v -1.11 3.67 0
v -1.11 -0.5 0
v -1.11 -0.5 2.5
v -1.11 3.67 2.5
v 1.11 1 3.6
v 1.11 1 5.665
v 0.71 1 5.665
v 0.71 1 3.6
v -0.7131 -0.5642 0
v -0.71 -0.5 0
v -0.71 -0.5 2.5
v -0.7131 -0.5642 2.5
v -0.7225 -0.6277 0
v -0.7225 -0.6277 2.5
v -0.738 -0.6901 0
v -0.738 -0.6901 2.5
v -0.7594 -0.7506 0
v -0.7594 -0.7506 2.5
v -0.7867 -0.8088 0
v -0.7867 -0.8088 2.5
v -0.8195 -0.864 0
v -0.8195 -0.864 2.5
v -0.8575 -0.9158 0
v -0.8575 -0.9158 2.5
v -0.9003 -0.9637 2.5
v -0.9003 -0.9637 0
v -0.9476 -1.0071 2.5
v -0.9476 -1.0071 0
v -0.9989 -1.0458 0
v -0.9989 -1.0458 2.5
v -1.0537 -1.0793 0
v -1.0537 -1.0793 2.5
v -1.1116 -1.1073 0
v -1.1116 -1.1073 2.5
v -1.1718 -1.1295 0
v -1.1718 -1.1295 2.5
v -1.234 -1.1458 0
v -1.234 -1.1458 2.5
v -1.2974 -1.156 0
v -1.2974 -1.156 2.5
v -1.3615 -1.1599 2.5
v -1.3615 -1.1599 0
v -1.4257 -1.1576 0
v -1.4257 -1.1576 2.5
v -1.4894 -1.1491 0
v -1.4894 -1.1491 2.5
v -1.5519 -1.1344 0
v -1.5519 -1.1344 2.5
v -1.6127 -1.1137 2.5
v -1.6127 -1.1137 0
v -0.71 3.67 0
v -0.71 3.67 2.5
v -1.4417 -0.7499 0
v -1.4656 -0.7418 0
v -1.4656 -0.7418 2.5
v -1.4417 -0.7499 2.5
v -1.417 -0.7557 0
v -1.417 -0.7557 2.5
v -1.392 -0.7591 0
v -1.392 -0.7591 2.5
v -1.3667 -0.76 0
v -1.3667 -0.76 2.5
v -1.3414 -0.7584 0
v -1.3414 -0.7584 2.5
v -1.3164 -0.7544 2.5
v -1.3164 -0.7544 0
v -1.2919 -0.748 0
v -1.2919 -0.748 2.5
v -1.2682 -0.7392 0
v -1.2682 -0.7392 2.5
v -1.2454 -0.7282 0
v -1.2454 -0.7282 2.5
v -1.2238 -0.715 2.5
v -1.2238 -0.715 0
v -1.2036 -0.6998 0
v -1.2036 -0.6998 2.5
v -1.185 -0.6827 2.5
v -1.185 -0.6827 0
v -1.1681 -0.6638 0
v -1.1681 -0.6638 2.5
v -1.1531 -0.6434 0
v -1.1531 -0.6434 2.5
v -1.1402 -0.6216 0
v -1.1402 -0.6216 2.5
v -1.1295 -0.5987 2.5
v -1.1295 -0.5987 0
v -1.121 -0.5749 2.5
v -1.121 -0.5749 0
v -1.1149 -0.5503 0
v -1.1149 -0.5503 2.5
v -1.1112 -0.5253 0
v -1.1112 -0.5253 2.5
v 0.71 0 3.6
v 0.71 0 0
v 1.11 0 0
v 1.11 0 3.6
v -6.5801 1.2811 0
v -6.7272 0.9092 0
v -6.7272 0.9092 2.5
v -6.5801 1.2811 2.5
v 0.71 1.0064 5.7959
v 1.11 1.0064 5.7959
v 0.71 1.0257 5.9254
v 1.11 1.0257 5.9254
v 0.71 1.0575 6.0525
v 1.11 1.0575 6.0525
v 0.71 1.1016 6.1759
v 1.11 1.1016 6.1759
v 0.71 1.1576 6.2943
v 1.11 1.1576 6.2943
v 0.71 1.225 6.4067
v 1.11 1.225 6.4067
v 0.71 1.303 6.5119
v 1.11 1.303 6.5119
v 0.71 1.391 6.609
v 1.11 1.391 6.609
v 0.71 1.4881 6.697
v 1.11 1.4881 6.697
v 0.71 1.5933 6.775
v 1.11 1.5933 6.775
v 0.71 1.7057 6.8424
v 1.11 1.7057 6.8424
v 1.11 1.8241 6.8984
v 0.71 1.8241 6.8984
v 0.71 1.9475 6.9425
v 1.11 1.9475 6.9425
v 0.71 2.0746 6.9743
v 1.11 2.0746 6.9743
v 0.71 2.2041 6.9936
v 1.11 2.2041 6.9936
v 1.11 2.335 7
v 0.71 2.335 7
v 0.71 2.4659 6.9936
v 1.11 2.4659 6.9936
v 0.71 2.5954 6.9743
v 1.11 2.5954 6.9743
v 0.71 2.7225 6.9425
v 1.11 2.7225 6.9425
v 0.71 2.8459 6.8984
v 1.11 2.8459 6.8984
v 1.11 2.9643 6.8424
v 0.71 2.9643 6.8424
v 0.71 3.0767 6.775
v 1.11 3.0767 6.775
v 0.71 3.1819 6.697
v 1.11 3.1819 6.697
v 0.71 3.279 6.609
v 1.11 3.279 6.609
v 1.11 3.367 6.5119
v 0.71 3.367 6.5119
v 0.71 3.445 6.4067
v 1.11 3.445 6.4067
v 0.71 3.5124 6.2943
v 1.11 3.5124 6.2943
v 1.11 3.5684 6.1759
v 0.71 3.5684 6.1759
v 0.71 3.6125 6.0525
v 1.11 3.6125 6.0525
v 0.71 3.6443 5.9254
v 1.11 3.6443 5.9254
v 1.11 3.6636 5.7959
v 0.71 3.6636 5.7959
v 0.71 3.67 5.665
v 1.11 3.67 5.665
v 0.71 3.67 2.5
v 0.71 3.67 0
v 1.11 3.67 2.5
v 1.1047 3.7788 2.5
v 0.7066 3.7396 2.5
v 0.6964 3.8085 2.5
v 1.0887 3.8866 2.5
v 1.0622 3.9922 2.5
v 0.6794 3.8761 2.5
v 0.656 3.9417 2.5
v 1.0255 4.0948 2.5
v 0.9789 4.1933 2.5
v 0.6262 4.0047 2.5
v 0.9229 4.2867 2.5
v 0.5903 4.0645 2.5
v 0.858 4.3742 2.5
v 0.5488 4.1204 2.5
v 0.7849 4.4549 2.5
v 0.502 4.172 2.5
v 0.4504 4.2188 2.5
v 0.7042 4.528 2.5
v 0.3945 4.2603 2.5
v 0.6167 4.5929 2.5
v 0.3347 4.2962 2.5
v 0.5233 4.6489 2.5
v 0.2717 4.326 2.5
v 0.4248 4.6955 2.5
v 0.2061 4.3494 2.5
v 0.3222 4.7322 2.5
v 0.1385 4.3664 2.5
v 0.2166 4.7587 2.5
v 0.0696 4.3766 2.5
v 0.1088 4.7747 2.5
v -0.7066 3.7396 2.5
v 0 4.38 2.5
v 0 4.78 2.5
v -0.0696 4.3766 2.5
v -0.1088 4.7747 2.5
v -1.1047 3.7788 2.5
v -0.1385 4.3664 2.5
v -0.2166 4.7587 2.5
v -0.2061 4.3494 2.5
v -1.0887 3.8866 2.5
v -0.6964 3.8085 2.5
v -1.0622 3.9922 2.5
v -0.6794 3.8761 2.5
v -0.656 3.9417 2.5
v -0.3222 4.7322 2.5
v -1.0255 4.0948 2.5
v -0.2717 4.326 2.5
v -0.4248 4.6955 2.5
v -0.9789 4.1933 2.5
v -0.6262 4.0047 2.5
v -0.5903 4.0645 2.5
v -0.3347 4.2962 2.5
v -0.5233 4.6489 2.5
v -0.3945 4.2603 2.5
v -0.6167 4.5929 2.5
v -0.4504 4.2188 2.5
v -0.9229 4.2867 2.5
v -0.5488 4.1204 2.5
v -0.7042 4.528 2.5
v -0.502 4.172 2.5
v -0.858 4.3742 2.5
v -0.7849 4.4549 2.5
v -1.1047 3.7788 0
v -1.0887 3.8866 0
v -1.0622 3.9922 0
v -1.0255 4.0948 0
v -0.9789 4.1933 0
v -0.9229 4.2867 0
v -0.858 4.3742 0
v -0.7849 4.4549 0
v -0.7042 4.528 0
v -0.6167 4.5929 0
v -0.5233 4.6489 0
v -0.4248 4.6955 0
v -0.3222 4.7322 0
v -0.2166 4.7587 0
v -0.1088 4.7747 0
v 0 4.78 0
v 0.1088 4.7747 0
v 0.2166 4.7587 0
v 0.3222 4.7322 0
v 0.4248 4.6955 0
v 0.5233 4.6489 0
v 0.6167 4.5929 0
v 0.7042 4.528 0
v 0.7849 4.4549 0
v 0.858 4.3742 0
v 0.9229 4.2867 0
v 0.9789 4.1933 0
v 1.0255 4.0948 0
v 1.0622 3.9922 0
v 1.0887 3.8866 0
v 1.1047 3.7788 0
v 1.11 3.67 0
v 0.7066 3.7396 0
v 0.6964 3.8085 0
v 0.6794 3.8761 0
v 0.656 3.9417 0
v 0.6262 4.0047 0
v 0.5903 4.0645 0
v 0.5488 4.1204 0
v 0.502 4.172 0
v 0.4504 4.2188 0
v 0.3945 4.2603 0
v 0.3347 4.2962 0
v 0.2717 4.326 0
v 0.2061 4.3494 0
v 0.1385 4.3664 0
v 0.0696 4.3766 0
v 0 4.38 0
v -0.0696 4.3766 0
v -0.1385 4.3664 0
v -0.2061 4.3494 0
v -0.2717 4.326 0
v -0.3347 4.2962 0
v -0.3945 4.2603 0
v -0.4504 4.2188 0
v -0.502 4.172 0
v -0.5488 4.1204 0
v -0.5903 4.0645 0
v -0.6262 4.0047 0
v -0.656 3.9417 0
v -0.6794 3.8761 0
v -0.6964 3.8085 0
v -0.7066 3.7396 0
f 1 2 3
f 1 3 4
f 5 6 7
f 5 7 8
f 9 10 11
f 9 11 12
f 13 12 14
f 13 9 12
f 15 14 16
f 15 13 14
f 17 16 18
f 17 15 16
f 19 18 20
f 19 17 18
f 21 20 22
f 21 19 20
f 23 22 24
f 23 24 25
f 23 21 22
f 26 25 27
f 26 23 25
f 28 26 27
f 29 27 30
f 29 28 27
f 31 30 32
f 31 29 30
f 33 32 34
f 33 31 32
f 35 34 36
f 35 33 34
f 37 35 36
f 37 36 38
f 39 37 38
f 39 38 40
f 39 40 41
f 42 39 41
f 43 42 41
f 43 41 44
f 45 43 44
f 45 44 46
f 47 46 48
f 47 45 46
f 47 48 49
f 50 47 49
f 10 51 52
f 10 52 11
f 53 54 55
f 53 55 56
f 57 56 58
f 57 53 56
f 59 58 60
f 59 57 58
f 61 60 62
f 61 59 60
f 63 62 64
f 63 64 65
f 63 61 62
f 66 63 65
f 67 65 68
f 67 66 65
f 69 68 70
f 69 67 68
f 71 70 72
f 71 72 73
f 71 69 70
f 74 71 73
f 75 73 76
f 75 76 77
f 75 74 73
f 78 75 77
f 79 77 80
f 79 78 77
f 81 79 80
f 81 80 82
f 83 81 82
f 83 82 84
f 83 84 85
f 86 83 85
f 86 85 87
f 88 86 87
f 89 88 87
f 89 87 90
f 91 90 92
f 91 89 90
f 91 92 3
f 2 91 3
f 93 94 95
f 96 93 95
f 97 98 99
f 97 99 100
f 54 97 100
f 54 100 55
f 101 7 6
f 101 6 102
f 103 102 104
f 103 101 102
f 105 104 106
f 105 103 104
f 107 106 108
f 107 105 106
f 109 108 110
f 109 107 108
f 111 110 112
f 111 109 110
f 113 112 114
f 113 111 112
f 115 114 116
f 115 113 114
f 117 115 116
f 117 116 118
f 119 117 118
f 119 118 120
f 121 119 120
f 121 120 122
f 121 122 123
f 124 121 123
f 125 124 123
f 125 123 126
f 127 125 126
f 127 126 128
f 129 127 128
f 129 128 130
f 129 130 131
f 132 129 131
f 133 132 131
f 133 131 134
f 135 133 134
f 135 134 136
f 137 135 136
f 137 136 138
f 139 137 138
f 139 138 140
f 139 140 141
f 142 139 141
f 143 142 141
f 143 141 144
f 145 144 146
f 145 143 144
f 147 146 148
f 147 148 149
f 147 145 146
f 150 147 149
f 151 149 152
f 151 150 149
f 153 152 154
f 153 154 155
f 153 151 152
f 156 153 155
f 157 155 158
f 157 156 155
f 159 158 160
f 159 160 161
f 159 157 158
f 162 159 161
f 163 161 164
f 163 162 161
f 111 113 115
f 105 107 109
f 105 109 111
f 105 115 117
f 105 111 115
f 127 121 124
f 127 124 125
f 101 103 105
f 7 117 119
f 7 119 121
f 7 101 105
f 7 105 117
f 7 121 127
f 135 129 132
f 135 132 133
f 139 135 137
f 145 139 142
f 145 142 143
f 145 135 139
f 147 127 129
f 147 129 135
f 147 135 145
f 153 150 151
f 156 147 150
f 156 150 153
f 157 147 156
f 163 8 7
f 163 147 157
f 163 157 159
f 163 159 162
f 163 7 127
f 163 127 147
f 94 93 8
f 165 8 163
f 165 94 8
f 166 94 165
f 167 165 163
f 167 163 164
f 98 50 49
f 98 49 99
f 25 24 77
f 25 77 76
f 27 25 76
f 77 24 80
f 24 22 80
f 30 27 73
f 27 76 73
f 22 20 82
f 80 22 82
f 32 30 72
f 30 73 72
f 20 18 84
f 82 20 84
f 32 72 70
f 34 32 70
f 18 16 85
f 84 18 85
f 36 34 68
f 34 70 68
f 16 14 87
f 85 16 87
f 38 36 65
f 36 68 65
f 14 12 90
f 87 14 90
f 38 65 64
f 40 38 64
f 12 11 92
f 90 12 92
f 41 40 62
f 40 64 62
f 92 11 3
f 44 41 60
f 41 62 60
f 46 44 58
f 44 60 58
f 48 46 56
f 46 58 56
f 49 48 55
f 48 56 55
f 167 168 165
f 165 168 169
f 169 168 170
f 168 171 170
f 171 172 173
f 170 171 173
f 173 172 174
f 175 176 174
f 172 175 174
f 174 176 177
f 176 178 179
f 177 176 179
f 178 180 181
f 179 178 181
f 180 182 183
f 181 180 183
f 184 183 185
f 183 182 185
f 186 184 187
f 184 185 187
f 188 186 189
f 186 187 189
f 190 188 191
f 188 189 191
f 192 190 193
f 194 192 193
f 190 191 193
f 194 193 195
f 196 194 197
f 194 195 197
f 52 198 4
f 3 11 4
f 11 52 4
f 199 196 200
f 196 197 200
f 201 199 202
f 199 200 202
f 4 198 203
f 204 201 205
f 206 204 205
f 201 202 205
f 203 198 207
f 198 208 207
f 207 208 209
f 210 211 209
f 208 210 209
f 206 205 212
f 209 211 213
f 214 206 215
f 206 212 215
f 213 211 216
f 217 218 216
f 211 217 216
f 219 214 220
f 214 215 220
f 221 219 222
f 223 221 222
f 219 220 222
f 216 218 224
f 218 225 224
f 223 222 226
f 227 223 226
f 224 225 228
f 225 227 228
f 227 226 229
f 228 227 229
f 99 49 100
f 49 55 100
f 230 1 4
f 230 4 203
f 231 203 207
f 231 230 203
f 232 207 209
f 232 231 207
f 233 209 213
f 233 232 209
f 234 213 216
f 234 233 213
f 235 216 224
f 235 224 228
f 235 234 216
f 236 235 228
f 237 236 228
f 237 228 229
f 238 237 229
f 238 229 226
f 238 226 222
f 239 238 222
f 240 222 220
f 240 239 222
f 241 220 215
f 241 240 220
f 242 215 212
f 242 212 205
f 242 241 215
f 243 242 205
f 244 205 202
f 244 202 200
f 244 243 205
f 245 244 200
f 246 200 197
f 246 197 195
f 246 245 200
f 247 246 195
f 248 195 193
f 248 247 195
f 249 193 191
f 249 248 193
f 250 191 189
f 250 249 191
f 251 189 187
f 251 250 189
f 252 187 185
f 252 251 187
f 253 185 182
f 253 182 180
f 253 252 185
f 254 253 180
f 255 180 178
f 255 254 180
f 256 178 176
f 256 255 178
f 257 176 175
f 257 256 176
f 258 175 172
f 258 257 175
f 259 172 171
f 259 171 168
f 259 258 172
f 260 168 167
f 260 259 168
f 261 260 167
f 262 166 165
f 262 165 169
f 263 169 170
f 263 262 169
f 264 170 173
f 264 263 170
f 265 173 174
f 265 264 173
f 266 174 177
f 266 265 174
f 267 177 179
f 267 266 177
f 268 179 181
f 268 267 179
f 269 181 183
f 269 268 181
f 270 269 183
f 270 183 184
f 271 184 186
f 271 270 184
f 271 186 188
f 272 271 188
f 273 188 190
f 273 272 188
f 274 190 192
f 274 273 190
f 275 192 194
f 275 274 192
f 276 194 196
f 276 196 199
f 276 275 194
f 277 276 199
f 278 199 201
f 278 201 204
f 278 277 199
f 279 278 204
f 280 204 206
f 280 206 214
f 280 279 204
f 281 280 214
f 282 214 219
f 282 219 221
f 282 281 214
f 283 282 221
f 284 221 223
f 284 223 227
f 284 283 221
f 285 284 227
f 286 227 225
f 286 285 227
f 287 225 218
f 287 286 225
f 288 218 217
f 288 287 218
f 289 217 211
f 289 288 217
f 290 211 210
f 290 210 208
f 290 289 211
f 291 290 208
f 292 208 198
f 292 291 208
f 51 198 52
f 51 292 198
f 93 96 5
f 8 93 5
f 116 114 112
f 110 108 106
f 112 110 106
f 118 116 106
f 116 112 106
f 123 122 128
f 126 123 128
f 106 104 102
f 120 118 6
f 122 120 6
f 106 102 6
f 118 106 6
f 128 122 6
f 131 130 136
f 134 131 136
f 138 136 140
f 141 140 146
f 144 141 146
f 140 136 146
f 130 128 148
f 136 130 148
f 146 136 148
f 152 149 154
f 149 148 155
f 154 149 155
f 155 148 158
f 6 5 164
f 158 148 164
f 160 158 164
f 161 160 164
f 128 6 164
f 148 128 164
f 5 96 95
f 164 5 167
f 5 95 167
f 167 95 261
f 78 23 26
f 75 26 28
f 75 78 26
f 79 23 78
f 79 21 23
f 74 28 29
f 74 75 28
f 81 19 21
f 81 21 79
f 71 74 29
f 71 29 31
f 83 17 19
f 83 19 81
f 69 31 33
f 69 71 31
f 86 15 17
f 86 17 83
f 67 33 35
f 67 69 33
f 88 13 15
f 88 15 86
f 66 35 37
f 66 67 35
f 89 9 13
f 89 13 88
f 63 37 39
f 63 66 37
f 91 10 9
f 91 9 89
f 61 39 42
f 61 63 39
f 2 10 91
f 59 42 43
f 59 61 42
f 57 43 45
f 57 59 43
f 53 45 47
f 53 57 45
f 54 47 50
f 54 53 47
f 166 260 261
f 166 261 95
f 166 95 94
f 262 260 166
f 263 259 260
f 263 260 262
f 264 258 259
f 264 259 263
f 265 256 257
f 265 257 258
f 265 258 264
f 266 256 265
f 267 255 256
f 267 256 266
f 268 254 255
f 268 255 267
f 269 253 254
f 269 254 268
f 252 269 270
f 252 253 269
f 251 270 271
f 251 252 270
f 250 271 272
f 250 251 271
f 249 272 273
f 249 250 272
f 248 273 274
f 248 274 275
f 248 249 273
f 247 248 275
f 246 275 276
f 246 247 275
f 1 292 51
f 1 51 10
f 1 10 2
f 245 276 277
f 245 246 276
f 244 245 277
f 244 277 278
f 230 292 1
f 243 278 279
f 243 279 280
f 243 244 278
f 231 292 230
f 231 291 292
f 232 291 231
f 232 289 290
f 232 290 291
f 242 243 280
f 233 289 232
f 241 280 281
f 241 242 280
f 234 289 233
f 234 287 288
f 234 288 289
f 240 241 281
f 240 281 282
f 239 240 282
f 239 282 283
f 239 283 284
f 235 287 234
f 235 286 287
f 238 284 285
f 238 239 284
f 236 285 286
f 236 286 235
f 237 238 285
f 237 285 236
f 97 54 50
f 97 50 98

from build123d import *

# Parameters (mm, degrees)
BASE_FLANGE1_DEPTH  = 2.5
SKETCH6_W           = 0.4
SKETCH6_H           = 3.67
BOSS_EXTRUDE1_DEPTH = 4.5
SKETCH7_W           = 3.4
SKETCH7_H           = 1
CUT_EXTRUDE1_DEPTH  = 4.5
FILLET1_RADIUS      = 1.335
FILLET1_LENGTH      = 0.4


# Sheet-metal steps are written as plain solids
with BuildPart() as part:
    # Sketch1 → Base-Flange1 (new body)
    with BuildSketch(Plane.XY):
        with BuildLine():
            Line((0.71, 0), (0.71, 3.67))
            ThreePointArc((0.71, 3.67), (0, 4.38), (-0.71, 3.67))
            Line((-0.71, 3.67), (-0.71, -0.5))
            ThreePointArc((-0.71, -0.5), (-0.998929703, -1.045808423), (-1.612747985, -1.113737253))
            Line((-1.612747985, -1.113737253), (-6.727225094, 0.909162621))
            Line((-6.727225094, 0.909162621), (-6.580105103, 1.281124592))
            Line((-6.580105103, 1.281124592), (-1.465627994, -0.741775282))
            ThreePointArc((-1.465627994, -0.741775282), (-1.223820792, -0.71501544), (-1.11, -0.5))
            Line((-1.11, -0.5), (-1.11, 3.67))
            ThreePointArc((-1.11, 3.67), (0, 4.78), (1.11, 3.67))
            Line((1.11, 3.67), (1.11, 0))
            Line((1.11, 0), (0.71, 0))
        make_face()
    extrude(amount=BASE_FLANGE1_DEPTH)

    # Sketch6 → Boss-Extrude1 (add)
    with BuildSketch(Plane.XY.offset(2.5)):
        with Locations((0.91, 1.835)):
            Rectangle(SKETCH6_W, SKETCH6_H)
    extrude(amount=BOSS_EXTRUDE1_DEPTH)

    # Sketch7 → Cut-Extrude1 (cut)
    with BuildSketch(Plane(origin=(1.11, 0, 0), x_dir=(0, 0, -1), z_dir=(1, 0, 0))):
        with Locations((-5.3, 0.5)):
            Rectangle(SKETCH7_W, SKETCH7_H)
    extrude(amount=-CUT_EXTRUDE1_DEPTH, mode=Mode.SUBTRACT)

    # Fillet1: full round fillet: the end face becomes a half cylinder, R = half its width
    fillet1_face = Plane((0.91, 2.335, 7), x_dir=(-1, 0, 0), z_dir=(0, 0, 1))  # on the end face: x along it, z out of the body
    fillet1_slab = fillet1_face.offset(-FILLET1_RADIUS / 2) * Box(FILLET1_LENGTH, 2 * FILLET1_RADIUS, FILLET1_RADIUS, mode=Mode.PRIVATE)  # the body's end, R deep
    fillet1_round = Plane((0.91, 2.335, 5.665), x_dir=(0, 0, 1), z_dir=(-1, 0, 0)) * Cylinder(FILLET1_RADIUS, FILLET1_LENGTH, mode=Mode.PRIVATE)  # its axis R under the face
    add(fillet1_slab - fillet1_round, mode=Mode.SUBTRACT)


solid = part.part
